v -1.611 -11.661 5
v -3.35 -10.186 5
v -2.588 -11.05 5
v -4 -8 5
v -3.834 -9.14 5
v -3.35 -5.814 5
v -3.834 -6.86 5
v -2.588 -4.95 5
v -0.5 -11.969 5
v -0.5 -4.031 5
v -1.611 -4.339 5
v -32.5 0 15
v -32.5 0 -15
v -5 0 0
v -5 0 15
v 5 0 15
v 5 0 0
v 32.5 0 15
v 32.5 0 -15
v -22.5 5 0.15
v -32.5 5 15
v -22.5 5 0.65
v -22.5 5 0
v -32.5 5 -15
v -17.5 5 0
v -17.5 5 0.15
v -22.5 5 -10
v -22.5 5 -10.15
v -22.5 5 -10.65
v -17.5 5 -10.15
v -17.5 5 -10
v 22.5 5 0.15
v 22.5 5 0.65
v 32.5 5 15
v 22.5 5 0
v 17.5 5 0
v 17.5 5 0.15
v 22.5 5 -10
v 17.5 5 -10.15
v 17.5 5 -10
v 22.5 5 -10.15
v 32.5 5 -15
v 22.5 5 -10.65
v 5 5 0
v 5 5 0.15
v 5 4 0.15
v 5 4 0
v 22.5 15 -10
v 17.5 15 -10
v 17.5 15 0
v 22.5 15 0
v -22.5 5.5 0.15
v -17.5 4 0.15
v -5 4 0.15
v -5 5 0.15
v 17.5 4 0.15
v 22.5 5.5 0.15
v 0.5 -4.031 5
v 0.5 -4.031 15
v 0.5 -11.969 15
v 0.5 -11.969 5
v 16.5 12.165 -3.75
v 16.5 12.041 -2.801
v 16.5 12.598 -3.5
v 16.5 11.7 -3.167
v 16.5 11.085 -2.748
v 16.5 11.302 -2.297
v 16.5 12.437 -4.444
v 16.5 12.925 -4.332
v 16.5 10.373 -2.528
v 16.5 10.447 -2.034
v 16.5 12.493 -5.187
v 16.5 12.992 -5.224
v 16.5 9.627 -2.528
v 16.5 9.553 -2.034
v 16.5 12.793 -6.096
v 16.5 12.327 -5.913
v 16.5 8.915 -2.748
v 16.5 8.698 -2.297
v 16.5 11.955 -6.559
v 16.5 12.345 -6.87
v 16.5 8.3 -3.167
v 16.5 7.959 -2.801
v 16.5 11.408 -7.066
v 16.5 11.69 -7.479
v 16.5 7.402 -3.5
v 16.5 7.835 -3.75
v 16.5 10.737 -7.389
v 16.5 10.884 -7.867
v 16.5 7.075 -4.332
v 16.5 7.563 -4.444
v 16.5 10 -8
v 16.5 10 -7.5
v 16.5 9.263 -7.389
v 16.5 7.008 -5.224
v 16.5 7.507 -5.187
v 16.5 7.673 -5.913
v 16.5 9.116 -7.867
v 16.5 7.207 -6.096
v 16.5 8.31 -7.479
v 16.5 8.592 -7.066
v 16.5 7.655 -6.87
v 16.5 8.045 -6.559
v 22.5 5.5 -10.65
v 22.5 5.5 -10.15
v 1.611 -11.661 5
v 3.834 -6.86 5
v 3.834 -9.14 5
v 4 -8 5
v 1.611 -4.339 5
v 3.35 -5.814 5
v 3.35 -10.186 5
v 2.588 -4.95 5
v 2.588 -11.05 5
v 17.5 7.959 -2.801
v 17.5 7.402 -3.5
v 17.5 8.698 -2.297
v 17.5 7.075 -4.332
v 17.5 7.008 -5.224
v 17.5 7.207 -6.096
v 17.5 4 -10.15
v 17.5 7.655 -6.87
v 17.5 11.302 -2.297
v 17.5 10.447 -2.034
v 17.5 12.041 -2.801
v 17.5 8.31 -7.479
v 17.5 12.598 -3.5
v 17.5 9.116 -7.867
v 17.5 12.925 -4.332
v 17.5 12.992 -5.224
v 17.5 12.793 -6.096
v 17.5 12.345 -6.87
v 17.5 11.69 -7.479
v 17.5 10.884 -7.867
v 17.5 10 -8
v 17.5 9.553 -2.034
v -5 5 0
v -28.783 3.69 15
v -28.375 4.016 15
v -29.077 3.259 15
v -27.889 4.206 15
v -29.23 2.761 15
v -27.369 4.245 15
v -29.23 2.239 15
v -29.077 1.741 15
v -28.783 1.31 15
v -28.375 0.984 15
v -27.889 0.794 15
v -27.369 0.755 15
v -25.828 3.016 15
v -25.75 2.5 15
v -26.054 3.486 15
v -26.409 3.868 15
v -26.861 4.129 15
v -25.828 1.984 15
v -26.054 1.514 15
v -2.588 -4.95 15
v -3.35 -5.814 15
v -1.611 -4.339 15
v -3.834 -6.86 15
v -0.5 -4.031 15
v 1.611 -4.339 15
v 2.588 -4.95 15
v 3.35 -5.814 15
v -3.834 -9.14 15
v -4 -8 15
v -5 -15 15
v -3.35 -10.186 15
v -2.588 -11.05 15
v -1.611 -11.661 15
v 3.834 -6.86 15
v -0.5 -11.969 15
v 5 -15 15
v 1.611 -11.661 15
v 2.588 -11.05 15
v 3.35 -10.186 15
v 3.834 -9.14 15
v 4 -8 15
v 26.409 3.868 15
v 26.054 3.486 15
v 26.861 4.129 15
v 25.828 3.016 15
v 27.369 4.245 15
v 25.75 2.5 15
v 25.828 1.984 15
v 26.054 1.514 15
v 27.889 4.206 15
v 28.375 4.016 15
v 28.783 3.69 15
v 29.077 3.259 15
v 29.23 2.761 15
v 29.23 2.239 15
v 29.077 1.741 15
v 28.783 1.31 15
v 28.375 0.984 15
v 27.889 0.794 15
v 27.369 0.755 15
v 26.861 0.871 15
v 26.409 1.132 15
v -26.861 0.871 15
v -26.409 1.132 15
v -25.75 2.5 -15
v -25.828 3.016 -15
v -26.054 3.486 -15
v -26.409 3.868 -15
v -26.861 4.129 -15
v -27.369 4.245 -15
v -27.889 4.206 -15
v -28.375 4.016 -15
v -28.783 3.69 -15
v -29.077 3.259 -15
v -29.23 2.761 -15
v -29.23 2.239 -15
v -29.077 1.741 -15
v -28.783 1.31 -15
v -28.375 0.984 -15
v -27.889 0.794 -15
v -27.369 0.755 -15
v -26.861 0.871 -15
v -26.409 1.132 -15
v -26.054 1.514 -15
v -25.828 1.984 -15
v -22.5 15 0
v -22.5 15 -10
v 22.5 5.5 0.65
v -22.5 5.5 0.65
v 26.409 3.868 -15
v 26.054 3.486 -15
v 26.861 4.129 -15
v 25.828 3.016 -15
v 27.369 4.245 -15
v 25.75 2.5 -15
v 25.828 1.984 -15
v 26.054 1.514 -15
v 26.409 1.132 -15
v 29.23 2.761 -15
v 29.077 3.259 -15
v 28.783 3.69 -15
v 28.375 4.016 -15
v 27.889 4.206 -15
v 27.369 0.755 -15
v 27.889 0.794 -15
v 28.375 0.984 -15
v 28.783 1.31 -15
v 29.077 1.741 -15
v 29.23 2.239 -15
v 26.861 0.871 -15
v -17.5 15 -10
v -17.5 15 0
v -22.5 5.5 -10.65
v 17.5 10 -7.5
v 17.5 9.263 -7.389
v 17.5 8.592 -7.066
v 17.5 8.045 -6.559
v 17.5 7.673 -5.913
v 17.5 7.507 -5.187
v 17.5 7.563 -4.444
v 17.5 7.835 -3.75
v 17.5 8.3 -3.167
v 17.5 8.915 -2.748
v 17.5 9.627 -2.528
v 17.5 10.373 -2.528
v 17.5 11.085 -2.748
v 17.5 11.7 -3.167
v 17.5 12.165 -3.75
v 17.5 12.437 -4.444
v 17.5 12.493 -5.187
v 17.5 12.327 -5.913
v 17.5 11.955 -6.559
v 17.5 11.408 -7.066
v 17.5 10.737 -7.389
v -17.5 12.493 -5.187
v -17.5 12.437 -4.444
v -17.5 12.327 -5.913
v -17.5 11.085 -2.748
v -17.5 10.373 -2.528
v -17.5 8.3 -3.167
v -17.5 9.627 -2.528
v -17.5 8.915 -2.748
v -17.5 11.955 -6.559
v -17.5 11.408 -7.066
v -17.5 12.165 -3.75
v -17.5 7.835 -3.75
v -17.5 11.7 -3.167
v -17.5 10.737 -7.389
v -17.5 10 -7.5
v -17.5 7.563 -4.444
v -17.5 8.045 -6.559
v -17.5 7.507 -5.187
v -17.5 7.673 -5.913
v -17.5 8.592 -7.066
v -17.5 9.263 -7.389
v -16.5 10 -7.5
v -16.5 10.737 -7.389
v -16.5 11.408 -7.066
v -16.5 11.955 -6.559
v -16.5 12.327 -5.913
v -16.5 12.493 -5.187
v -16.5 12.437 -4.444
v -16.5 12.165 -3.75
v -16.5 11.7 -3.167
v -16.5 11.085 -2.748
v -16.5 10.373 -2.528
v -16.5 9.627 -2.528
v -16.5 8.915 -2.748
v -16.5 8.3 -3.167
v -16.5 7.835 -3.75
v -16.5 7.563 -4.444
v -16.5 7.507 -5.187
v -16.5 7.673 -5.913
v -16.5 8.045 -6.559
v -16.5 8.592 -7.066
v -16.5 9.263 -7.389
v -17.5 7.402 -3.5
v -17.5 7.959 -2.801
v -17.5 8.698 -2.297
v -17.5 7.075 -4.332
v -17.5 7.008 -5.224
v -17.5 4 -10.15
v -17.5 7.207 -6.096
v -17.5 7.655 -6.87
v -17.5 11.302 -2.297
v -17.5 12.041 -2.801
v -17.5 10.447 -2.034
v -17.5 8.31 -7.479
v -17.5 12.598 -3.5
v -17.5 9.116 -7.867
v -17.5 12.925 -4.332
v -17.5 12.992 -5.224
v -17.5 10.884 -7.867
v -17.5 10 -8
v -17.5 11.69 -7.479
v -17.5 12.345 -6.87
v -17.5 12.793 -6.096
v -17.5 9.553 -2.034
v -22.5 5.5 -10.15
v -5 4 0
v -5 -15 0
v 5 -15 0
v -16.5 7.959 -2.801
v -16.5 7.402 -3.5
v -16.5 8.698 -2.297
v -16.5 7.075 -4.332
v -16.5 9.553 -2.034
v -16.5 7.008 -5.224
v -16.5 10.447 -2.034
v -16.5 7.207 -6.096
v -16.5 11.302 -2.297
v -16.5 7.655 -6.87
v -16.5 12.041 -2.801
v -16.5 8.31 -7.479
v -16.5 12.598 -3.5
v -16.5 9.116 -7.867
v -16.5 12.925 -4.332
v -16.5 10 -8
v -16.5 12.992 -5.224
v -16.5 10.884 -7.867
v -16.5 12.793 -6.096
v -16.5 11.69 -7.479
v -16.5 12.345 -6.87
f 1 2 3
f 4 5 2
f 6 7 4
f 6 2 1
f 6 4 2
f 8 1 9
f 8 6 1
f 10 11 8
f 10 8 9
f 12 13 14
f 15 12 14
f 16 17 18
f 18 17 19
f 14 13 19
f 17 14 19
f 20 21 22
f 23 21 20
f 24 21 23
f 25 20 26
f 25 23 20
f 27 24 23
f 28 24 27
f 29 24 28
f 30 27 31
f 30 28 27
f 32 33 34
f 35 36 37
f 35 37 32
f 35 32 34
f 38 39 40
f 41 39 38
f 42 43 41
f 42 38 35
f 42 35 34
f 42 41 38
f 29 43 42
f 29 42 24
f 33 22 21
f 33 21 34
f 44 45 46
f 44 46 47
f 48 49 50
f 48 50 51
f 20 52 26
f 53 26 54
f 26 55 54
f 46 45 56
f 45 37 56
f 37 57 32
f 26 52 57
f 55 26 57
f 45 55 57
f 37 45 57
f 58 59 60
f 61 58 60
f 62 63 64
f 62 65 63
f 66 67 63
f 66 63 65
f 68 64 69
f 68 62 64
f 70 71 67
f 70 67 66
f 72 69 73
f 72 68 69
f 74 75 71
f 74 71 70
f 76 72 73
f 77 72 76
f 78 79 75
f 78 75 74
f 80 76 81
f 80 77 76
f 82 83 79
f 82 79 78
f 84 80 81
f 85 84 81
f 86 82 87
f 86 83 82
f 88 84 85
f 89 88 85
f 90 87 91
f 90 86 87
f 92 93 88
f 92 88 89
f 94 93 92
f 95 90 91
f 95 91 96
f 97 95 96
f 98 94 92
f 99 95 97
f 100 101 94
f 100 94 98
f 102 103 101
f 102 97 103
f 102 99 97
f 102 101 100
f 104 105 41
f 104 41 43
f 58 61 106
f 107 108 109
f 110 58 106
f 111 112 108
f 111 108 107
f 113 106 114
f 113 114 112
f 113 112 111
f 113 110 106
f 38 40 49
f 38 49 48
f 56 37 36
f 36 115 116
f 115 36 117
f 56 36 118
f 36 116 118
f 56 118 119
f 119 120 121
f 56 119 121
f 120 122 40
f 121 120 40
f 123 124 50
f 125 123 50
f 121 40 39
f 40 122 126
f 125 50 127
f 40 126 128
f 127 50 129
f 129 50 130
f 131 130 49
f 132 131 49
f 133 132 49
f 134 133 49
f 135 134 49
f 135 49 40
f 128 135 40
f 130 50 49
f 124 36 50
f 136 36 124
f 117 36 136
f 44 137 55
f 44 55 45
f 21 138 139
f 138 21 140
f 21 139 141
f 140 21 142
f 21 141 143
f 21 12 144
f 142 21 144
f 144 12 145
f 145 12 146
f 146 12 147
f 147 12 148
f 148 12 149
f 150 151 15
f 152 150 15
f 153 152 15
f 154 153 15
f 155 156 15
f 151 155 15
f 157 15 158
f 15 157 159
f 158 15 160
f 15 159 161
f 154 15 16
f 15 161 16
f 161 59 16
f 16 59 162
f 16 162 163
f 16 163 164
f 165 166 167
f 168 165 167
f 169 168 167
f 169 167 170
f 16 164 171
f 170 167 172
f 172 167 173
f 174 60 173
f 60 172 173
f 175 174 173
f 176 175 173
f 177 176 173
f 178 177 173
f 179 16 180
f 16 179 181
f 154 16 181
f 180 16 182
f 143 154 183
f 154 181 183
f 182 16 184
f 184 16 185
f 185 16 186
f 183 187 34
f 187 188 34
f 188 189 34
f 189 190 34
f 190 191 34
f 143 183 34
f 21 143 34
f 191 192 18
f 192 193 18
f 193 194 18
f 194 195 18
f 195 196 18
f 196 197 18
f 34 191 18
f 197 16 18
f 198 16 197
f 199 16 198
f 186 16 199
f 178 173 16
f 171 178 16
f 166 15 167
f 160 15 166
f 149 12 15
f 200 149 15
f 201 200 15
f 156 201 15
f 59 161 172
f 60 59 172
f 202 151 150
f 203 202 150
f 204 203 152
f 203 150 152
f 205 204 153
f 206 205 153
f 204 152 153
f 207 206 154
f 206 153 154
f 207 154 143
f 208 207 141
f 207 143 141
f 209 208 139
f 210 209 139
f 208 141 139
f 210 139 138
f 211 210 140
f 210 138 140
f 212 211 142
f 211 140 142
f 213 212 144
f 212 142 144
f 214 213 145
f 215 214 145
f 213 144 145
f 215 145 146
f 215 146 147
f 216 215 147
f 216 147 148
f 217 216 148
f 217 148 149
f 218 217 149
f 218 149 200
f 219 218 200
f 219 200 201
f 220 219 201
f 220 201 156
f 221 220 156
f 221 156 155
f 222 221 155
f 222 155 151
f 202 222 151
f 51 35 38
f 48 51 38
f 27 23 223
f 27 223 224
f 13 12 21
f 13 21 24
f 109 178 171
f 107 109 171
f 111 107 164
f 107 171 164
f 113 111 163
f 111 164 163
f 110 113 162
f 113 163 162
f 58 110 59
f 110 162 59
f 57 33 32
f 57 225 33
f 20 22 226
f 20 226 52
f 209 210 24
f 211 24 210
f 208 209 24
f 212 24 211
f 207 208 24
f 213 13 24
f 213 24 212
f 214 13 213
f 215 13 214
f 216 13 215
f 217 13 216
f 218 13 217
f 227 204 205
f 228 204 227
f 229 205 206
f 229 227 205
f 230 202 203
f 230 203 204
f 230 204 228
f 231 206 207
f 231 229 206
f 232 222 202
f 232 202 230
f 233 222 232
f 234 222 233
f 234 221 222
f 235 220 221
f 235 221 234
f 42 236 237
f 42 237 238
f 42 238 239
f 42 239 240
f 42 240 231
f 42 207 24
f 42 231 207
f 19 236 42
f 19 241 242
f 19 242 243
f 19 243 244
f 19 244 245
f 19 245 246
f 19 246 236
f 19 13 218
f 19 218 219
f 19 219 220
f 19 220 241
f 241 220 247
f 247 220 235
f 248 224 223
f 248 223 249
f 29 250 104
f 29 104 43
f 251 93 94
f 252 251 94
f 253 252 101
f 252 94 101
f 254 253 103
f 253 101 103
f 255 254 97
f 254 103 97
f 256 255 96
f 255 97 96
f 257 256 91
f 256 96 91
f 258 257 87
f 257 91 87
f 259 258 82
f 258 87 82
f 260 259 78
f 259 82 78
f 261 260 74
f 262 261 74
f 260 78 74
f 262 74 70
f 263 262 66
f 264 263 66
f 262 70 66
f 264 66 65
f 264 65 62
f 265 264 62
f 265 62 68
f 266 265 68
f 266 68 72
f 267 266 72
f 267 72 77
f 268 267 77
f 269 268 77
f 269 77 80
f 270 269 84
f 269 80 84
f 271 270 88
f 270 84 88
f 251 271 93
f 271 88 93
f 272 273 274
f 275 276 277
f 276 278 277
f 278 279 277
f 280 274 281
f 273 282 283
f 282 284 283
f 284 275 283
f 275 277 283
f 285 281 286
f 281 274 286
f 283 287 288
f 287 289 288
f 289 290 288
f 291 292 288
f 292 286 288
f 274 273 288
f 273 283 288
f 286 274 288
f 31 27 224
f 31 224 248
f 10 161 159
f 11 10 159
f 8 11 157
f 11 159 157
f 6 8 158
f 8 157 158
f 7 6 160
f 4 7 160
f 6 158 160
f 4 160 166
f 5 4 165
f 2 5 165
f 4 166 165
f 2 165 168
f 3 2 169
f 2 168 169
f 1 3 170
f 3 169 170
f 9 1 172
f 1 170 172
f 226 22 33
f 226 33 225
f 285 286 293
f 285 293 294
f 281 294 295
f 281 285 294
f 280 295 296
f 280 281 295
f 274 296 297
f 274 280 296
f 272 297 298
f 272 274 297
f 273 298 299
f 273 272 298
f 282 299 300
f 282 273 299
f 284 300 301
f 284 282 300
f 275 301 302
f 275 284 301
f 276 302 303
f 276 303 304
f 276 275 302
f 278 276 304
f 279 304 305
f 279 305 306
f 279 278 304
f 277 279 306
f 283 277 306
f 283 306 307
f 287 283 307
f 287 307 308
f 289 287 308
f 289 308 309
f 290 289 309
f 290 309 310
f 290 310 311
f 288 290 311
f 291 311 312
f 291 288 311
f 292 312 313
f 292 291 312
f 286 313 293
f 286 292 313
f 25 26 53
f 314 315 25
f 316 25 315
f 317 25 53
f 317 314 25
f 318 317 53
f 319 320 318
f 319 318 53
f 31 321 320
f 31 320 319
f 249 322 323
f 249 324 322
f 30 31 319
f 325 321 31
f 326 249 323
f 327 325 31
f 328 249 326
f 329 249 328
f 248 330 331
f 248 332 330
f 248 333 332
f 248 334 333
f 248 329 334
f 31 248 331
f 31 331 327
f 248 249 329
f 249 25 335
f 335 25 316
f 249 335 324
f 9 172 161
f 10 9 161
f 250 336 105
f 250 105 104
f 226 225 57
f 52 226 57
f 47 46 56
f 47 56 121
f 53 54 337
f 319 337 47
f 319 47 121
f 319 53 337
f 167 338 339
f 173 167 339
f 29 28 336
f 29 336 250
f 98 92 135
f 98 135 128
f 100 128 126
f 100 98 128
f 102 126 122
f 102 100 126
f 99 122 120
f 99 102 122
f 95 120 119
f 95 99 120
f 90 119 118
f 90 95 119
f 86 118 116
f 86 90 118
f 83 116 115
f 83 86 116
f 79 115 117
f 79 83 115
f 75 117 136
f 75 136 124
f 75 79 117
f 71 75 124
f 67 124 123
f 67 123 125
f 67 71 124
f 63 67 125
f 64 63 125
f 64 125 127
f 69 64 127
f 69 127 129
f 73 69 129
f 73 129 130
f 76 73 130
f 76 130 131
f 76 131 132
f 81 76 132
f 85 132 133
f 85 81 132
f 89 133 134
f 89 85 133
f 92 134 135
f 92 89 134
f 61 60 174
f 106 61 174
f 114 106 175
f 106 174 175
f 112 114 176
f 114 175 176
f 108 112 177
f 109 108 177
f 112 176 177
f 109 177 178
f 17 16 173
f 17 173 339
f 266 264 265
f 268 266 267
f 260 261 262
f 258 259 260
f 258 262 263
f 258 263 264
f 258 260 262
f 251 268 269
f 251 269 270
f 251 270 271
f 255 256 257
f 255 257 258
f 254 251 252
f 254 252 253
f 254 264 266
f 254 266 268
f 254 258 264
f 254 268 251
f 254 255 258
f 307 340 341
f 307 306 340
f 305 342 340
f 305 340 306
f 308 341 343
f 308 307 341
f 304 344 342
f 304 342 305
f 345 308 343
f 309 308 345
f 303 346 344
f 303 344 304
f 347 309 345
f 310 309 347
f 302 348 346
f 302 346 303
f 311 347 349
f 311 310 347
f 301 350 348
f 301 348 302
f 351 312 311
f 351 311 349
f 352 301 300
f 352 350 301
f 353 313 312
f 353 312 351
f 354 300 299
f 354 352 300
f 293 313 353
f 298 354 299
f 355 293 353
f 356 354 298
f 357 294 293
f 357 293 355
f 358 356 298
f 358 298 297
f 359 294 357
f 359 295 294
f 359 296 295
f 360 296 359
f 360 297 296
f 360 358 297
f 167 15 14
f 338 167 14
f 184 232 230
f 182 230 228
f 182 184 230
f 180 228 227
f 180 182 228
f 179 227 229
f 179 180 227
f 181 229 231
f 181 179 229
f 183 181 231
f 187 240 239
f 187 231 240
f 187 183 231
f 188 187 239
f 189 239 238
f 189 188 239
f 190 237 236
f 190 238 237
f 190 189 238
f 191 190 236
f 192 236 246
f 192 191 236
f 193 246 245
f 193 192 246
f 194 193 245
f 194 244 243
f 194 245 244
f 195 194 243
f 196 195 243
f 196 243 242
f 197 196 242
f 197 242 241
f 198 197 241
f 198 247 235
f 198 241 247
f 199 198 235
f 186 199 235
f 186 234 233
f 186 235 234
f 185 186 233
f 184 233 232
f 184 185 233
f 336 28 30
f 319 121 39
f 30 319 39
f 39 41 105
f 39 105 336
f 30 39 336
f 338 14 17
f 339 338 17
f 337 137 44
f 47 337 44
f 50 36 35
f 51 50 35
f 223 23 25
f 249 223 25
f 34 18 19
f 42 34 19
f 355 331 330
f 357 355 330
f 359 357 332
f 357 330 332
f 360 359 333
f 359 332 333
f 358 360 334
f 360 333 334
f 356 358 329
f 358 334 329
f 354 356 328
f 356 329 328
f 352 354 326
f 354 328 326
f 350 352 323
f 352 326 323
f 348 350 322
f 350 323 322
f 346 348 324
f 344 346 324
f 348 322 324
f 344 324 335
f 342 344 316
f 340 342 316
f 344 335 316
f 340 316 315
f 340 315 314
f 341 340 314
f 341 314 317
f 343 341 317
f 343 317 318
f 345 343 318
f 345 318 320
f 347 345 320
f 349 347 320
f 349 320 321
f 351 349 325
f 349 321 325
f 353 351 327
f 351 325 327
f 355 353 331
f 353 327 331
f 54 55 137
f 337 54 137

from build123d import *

# Parameters (mm, degrees)
SKETCH1_W                       = 65
SKETCH1_H                       = 30
SKETCH1_W_2                     = 5
SKETCH1_H_2                     = 10
BOSS_EXTRUDE1_DEPTH             = 5
SKETCH1_4_W                     = 5
SKETCH1_4_H                     = 10
BOSS_EXTRUDE2_DEPTH             = 15
SKETCH2_R                       = 3
SKETCH2_R_2                     = 2.5
BOSS_EXTRUDE3_DEPTH             = 1
BOSS_EXTRUDE4_START             = 1
SKETCH3_R                       = 3
SKETCH3_R_2                     = 2.5
BOSS_EXTRUDE4_DEPTH             = 1
BOSS_EXTRUDE5_REACH             = 56.314
BOSS_EXTRUDE5_DIRECTION_2_REACH = 56.314
CUT_EXTRUDE2_DEPTH              = 35
SKETCH5_R                       = 1.75
CUT_EXTRUDE3_DEPTH              = 47.703854231
SKETCH7_R                       = 1
CUT_EXTRUDE5_DEPTH              = 4.5
SKETCH10_W                      = 10
SKETCH10_H                      = 15
BOSS_EXTRUDE7_DEPTH             = 20
CUT_EXTRUDE8_DEPTH              = 10


with BuildPart() as part:
    # Sketch1 → Boss-Extrude1 (new body)
    with BuildSketch(Plane(origin=(0, 0, 0), x_dir=(1, 0, 0), z_dir=(0, 1, 0))):
        Rectangle(SKETCH1_W, SKETCH1_H)
        with Locations((20, 5)):
            Rectangle(SKETCH1_W_2, SKETCH1_H_2, mode=Mode.SUBTRACT)
        with Locations((-20, 5)):
            Rectangle(SKETCH1_W_2, SKETCH1_H_2, mode=Mode.SUBTRACT)
    extrude(amount=BOSS_EXTRUDE1_DEPTH)

    # Sketch1<4> → Boss-Extrude2 (add)
    with BuildSketch(Plane(origin=(0, 0, 0), x_dir=(1, 0, 0), z_dir=(0, 1, 0))):
        with Locations((20, 5)):
            Rectangle(SKETCH1_4_W, SKETCH1_4_H)
        with Locations((-20, 5)):
            Rectangle(SKETCH1_4_W, SKETCH1_4_H)
    extrude(amount=BOSS_EXTRUDE2_DEPTH)

    # Sketch2 → Boss-Extrude3 (add)
    with BuildSketch(Plane(origin=(-17.5, 0, 0), x_dir=(0, 0, -1), z_dir=(1, 0, 0))):
        with Locations((5, 10)):
            Circle(SKETCH2_R)
        with Locations((5, 10)):
            Circle(SKETCH2_R_2, mode=Mode.SUBTRACT)
    extrude(amount=BOSS_EXTRUDE3_DEPTH)

    # Sketch3 → Boss-Extrude4 (add)
    with BuildSketch(Plane.ZY.offset(-17.5).offset(BOSS_EXTRUDE4_START)):
        with Locations(Location((-5, 10, 0), (0, 0, 180))):
            Circle(SKETCH3_R)
        with Locations(Location((-5, 10, 0), (0, 0, 180))):
            Circle(SKETCH3_R_2, mode=Mode.SUBTRACT)
    extrude(amount=-BOSS_EXTRUDE4_DEPTH)

    # Boss-Extrude5: up to this face of the body (flat: up to its plane)
    boss_extrude5_end = Plane(part.part.faces().sort_by_distance((22.5, 10, -5))[0])
    # Sketch4 → Boss-Extrude5 (add, up to the picked face)
    with BuildSketch(Plane(origin=(-17.5, 0, 0), x_dir=(0, 0, -1), z_dir=(1, 0, 0)), mode=Mode.PRIVATE) as boss_extrude5_sk1:
        Polygon((10.15, 5.5), (10.65, 5.5), (10.65, 3.5), (-0.65, 3.5), (-0.65, 5.5), (-0.15, 5.5), (-0.15, 4), (10.15, 4), align=None)
    boss_extrude5_tool1 = split(extrude(boss_extrude5_sk1.sketch, amount=BOSS_EXTRUDE5_REACH, mode=Mode.PRIVATE), bisect_by=boss_extrude5_end, keep=Keep.BOTH, mode=Mode.PRIVATE)
    add(boss_extrude5_tool1.solids().sort_by(Axis((-17.5, 3.95979, -5), (1, 0, 0)))[0])

    # Boss-Extrude5 direction 2: up to this face of the body (flat: up to its plane)
    boss_extrude5_direction_2_end = Plane(part.part.faces().sort_by_distance((-22.5, 10, -5))[0])
    # Sketch4 → Boss-Extrude5 direction 2 (add, up to the picked face)
    with BuildSketch(Plane(origin=(-17.5, 0, 0), x_dir=(0, 0, -1), z_dir=(1, 0, 0)), mode=Mode.PRIVATE) as boss_extrude5_direction_2_sk1:
        Polygon((10.15, 5.5), (10.65, 5.5), (10.65, 3.5), (-0.65, 3.5), (-0.65, 5.5), (-0.15, 5.5), (-0.15, 4), (10.15, 4), align=None)
    boss_extrude5_direction_2_tool1 = split(extrude(boss_extrude5_direction_2_sk1.sketch, amount=-BOSS_EXTRUDE5_DIRECTION_2_REACH, mode=Mode.PRIVATE), bisect_by=boss_extrude5_direction_2_end, keep=Keep.BOTH, mode=Mode.PRIVATE)
    add(boss_extrude5_direction_2_tool1.solids().sort_by(Axis((-17.5, 3.95979, -5), (-1, 0, 0)))[0])

    # Sketch4<5> → Cut-Extrude2 (cut)
    with BuildSketch(Plane(origin=(-17.5, 0, 0), x_dir=(0, 0, -1), z_dir=(1, 0, 0))):
        Polygon((0, 5.5), (-0.15, 5.5), (-0.15, 4), (10.15, 4), (10.15, 5.5), (10, 5.5), (10, 5), (0, 5), align=None)
    extrude(amount=CUT_EXTRUDE2_DEPTH, mode=Mode.SUBTRACT)

    # Sketch5 → Cut-Extrude3 (cut, through all)
    with BuildSketch(Plane.XY.offset(15)):
        with Locations((-27.5, 2.5)):
            Circle(SKETCH5_R)
    cut_extrude3 = extrude(amount=-CUT_EXTRUDE3_DEPTH, mode=Mode.SUBTRACT)

    # Mirror1: Cut-Extrude3 across plane
    add(cut_extrude3.mirror(Plane(origin=(0, 0, 0), x_dir=(0, 0, 1), z_dir=(1, 0, 0))), mode=Mode.SUBTRACT)

    # Sketch7 → Cut-Extrude5 (cut)
    with BuildSketch(Plane(origin=(0, 5, 0), x_dir=(1, 0, 0), z_dir=(0, 1, 0))):
        with Locations(Location((0, -10, 0), (0, 0, 270))):
            Circle(SKETCH7_R)
        with Locations(Location((0, -5, 0), (0, 0, 270))):
            Circle(SKETCH7_R)
    extrude(amount=-CUT_EXTRUDE5_DEPTH, mode=Mode.SUBTRACT)

    # Sketch10 → Boss-Extrude7 (add)
    with BuildSketch(Plane(origin=(0, 5, 0), x_dir=(1, 0, 0), z_dir=(0, 1, 0))):
        with Locations((0, -7.5)):
            Rectangle(SKETCH10_W, SKETCH10_H)
    extrude(amount=-BOSS_EXTRUDE7_DEPTH)

    # Sketch11 → Cut-Extrude8 (cut)
    with BuildSketch(Plane.XY.offset(15)):
        with BuildLine():
            ThreePointArc((-0.5, -4.031373033), (-4, -8), (-0.5, -11.968626967))
            Line((-0.5, -11.968626967), (-0.5, -4.031373033))
        make_face()
        with BuildLine():
            Line((0.5, -4.031373033), (0.5, -11.968626967))
            ThreePointArc((0.5, -11.968626967), (3, -10.645751311), (4, -8))
            ThreePointArc((4, -8), (3, -5.354248689), (0.5, -4.031373033))
        make_face()
    extrude(amount=-CUT_EXTRUDE8_DEPTH, mode=Mode.SUBTRACT)


solid = part.part
